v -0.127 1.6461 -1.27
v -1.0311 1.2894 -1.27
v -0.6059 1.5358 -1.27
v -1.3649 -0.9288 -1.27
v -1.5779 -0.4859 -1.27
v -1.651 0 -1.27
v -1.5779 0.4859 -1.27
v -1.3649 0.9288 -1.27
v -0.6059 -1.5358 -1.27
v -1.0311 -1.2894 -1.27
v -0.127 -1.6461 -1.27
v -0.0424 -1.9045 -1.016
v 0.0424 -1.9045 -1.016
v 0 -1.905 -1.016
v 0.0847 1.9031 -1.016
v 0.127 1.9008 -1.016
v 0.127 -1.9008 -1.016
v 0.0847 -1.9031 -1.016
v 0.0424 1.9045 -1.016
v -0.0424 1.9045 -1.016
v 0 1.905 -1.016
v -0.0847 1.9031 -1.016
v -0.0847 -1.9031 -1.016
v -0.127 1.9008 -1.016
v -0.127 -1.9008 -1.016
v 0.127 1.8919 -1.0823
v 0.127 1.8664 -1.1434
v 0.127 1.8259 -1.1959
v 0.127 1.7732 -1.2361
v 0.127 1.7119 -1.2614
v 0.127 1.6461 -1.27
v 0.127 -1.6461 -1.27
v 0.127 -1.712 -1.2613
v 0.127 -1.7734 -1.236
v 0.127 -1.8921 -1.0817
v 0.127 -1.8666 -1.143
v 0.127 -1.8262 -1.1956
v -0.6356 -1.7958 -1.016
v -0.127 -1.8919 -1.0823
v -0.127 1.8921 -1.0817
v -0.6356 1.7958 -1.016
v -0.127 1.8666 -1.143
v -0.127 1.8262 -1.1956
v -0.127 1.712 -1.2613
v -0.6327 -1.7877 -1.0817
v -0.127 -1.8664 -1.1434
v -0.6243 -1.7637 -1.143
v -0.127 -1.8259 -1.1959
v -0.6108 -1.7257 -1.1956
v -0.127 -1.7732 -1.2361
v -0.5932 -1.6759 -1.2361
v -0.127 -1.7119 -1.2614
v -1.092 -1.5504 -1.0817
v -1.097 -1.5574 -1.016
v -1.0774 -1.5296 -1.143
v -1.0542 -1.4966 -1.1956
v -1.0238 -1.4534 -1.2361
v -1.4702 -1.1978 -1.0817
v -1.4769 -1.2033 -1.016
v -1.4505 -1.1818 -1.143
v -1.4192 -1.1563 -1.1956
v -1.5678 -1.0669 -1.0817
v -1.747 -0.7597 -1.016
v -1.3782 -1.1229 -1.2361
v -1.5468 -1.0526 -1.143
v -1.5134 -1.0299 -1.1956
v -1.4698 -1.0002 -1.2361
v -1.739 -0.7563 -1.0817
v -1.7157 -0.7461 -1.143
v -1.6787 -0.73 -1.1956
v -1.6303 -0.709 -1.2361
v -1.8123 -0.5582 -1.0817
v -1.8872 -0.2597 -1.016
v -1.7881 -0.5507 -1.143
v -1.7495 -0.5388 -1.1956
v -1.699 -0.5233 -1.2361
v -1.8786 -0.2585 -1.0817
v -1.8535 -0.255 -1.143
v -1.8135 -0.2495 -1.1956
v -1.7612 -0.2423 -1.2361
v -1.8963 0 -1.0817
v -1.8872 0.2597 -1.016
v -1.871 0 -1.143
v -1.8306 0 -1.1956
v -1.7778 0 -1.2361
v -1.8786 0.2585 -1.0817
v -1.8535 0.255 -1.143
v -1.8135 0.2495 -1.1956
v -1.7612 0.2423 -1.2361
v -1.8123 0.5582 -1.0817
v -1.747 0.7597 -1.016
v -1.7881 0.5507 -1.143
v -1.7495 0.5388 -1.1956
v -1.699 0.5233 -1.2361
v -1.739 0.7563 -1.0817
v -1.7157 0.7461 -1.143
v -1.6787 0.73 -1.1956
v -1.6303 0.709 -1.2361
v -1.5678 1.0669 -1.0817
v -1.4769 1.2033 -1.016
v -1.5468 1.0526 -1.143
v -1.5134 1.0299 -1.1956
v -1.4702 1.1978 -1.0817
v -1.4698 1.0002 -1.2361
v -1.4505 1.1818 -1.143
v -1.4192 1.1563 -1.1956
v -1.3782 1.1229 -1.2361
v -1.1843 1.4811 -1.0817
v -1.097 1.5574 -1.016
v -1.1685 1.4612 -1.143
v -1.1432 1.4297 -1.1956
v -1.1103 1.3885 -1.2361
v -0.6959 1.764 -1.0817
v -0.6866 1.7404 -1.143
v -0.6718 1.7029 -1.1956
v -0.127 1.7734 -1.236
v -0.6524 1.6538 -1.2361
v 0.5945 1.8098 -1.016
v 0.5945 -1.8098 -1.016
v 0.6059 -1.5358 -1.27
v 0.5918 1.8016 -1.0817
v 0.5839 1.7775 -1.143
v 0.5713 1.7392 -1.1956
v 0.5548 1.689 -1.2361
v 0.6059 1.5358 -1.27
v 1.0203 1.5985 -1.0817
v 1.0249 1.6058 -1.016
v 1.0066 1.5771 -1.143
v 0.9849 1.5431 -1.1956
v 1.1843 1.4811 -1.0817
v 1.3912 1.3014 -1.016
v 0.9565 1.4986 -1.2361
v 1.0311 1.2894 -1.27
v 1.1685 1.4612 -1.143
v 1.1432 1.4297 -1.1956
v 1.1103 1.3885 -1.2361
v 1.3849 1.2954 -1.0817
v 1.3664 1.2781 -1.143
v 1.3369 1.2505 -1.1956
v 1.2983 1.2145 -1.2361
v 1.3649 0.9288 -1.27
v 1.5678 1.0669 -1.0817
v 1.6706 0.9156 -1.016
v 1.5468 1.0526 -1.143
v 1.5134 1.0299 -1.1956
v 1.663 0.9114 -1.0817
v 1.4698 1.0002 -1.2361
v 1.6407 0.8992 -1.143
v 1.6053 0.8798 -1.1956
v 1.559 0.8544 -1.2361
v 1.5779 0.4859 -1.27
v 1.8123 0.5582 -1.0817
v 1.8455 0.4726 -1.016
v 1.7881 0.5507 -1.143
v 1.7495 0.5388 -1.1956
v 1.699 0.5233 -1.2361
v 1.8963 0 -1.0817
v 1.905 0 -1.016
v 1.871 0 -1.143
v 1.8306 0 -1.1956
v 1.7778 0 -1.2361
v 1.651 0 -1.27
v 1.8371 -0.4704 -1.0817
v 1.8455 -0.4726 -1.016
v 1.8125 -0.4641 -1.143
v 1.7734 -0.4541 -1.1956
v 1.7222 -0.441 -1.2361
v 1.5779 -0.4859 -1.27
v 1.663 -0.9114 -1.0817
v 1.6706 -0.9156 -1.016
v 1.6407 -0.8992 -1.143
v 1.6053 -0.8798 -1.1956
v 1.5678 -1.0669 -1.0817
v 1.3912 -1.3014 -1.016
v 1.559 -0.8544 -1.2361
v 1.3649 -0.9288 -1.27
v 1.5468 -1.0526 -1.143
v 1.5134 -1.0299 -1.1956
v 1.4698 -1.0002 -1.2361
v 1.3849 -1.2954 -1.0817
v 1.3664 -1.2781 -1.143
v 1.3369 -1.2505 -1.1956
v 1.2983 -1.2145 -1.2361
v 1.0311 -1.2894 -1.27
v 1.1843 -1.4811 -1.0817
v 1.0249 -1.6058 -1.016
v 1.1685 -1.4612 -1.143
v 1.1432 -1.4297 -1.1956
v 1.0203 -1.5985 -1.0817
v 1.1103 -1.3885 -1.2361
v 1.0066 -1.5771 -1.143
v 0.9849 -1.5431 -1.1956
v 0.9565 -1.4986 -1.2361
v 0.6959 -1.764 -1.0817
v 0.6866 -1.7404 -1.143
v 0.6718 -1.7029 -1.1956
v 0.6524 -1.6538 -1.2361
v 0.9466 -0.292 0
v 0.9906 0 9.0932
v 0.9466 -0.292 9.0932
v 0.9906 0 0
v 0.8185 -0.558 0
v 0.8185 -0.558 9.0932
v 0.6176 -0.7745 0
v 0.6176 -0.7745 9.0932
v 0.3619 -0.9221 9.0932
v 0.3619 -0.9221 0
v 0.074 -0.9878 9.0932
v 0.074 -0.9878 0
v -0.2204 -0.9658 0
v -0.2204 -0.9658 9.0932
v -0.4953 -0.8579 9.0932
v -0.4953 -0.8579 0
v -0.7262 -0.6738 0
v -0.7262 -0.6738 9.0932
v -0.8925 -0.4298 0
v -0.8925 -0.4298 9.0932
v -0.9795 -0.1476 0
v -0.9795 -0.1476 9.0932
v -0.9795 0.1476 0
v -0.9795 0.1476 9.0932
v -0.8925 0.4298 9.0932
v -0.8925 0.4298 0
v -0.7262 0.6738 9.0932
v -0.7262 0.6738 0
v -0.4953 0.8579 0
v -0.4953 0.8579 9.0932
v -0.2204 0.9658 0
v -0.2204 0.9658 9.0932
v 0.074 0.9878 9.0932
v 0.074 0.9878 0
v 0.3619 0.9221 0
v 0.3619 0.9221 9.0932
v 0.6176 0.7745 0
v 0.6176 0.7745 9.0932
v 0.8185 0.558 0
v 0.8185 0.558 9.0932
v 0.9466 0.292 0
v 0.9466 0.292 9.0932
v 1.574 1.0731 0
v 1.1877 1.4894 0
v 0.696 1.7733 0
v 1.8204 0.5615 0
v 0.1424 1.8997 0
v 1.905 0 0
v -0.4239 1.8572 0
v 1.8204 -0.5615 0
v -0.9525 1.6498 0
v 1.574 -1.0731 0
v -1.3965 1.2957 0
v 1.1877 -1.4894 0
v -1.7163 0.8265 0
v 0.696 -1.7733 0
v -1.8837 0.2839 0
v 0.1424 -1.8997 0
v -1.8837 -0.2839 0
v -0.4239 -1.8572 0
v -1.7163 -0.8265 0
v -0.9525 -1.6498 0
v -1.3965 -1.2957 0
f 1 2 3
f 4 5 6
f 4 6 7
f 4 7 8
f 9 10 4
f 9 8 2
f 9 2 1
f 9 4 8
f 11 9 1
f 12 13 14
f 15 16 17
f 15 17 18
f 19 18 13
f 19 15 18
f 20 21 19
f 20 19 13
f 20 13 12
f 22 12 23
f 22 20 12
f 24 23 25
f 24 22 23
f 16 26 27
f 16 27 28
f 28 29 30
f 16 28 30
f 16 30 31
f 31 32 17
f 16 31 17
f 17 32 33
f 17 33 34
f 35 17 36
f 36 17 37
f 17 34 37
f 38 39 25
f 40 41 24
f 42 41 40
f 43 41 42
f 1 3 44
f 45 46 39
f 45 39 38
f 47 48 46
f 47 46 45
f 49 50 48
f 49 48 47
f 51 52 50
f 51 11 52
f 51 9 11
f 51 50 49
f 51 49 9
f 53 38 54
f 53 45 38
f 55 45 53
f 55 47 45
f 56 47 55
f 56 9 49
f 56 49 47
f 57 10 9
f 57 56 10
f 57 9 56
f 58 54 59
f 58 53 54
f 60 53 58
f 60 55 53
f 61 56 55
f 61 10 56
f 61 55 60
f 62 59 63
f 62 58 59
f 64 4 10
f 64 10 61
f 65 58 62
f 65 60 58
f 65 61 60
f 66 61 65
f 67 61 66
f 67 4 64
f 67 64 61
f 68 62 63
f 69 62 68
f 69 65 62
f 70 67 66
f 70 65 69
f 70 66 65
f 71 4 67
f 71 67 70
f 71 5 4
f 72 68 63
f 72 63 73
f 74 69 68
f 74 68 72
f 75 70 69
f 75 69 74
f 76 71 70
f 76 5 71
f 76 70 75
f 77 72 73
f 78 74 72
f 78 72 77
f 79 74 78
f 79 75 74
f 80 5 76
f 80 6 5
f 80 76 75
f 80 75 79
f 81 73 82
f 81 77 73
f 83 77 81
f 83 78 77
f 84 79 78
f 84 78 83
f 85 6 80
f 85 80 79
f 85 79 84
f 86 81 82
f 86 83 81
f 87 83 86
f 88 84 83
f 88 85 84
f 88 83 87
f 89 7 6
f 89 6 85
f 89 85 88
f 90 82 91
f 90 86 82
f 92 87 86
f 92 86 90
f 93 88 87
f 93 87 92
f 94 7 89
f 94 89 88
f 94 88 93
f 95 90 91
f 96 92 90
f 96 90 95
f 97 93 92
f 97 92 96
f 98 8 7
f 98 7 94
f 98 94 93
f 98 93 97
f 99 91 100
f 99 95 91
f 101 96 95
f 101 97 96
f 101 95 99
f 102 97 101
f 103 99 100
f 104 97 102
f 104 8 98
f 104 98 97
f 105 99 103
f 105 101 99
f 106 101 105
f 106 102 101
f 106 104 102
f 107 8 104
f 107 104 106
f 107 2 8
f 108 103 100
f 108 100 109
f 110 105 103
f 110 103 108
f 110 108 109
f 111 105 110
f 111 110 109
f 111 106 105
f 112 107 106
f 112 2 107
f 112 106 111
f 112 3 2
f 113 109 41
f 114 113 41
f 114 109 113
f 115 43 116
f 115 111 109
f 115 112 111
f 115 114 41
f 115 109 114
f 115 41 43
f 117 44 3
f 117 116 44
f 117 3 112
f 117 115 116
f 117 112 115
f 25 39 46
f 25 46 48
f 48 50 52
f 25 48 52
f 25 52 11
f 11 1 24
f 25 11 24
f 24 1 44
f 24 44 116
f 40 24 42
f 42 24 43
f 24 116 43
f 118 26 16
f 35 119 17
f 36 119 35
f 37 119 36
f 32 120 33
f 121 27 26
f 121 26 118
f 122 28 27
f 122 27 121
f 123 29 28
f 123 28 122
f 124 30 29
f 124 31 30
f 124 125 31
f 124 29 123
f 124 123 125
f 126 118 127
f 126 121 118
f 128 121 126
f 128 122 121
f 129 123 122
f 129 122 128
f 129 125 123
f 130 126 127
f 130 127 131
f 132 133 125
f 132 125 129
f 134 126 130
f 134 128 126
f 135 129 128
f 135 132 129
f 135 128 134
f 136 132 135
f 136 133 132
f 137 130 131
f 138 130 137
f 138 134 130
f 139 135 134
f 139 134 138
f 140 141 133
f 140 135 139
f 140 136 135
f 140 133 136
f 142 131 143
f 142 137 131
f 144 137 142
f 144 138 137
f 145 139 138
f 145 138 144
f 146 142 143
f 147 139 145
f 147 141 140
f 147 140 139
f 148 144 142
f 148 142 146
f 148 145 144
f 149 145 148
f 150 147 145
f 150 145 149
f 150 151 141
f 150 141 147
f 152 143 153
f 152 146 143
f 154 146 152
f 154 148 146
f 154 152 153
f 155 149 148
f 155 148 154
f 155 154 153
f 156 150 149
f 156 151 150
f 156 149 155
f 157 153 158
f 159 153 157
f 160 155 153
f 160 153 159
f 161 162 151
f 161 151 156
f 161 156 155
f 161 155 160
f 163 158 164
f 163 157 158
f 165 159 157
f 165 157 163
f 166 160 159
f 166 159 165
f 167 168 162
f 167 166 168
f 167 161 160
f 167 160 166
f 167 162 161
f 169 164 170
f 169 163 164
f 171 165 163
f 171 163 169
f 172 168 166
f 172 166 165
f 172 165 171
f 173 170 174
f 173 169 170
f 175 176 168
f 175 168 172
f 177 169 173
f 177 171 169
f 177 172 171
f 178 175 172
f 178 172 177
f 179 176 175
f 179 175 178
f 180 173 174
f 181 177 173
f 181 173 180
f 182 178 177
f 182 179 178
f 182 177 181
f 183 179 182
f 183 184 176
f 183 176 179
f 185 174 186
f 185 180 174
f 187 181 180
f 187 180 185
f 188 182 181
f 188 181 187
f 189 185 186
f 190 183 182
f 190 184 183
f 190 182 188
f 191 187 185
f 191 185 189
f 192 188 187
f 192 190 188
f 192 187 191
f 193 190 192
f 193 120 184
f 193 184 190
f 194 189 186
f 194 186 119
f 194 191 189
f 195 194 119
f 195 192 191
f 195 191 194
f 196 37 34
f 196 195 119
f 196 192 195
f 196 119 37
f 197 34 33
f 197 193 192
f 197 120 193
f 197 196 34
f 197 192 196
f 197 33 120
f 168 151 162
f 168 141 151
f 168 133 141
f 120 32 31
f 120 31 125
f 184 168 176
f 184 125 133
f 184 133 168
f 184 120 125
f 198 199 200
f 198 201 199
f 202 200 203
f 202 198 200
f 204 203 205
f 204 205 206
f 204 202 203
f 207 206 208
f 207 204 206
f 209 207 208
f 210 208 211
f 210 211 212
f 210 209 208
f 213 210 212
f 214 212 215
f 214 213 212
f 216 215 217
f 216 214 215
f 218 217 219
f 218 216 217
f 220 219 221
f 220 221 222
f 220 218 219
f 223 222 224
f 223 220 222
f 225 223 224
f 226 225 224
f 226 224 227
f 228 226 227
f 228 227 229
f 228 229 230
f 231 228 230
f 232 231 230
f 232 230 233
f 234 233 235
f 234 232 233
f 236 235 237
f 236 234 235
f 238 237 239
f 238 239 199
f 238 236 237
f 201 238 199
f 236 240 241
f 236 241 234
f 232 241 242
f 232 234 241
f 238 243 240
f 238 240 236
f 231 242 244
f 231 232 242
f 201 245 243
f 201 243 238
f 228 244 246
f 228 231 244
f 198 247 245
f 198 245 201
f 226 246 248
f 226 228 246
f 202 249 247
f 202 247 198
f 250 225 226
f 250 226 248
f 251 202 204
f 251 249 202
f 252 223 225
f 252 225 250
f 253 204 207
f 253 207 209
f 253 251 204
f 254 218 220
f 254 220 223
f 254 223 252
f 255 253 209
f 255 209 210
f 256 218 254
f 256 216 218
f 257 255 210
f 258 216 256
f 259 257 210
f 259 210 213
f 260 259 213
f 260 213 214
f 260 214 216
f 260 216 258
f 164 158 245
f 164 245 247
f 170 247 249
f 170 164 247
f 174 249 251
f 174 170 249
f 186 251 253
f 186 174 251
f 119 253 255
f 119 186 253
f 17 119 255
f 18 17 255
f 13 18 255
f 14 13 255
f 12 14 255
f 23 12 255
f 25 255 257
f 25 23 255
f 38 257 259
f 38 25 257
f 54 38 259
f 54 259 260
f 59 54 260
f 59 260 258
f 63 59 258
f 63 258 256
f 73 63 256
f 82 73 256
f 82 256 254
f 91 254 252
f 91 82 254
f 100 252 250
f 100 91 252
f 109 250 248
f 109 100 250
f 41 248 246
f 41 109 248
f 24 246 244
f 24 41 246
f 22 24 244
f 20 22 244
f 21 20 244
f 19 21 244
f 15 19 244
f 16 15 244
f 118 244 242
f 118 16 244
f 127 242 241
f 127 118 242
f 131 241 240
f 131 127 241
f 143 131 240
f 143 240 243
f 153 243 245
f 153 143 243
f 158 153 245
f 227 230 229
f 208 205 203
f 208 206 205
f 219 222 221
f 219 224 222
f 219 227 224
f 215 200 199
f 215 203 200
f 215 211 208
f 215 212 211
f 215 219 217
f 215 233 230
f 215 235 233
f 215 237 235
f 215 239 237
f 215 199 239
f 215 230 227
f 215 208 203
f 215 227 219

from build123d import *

# Parameters (mm, degrees)
CUT_EXTRUDE1_DEPTH = 0.254
FILLET1_R          = 0.254


with BuildPart() as part:
    # Sketch3 → Revolve1 (revolve)
    with BuildSketch(Plane(origin=(0, 0, 0), x_dir=(0, 0, -1), z_dir=(1, 0, 0)), mode=Mode.PRIVATE) as revolve1_sk:
        Polygon((0, 1.905), (1.27, 1.905), (1.27, 0), (0, 0), (-9.0932, 0), (-9.0932, 0.9906), (0, 0.9906), align=None)
    revolve(revolve1_sk.sketch.rotate(Axis((0, 0, 55), (0, 0, -1)), 90), axis=Axis((0, 0, 55), (0, 0, -1)))

    # Sketch4 → Cut-Extrude1 (cut)
    with BuildSketch(Plane(origin=(0, 0, -1.27), x_dir=(-1, 0, 0), z_dir=(0, 0, -1))):
        with BuildLine():
            Line((0, -1.905), (0, 1.905))
            ThreePointArc((0, 1.905), (-0.063535, 1.90394), (-0.127, 1.900762))
            Line((-0.127, 1.900762), (-0.127, -1.900762))
            ThreePointArc((-0.127, -1.900762), (-0.063535, -1.90394), (0, -1.905))
        make_face()
        with BuildLine():
            ThreePointArc((0.127, 1.900762), (0.063535, 1.90394), (0, 1.905))
            Line((0, 1.905), (0, -1.905))
            ThreePointArc((0, -1.905), (0.063535, -1.90394), (0.127, -1.900762))
            Line((0.127, -1.900762), (0.127, 1.900762))
        make_face()
    extrude(amount=-CUT_EXTRUDE1_DEPTH, mode=Mode.SUBTRACT)

    # Fillet1
    fillet1_edges = [part.edges().sort_by_distance(p)[0] for p in [
        (-1.905, 0, -1.27),
        (1.391215, 1.301363, -1.27),
    ]]
    fillet(fillet1_edges, radius=FILLET1_R)


solid = part.part
